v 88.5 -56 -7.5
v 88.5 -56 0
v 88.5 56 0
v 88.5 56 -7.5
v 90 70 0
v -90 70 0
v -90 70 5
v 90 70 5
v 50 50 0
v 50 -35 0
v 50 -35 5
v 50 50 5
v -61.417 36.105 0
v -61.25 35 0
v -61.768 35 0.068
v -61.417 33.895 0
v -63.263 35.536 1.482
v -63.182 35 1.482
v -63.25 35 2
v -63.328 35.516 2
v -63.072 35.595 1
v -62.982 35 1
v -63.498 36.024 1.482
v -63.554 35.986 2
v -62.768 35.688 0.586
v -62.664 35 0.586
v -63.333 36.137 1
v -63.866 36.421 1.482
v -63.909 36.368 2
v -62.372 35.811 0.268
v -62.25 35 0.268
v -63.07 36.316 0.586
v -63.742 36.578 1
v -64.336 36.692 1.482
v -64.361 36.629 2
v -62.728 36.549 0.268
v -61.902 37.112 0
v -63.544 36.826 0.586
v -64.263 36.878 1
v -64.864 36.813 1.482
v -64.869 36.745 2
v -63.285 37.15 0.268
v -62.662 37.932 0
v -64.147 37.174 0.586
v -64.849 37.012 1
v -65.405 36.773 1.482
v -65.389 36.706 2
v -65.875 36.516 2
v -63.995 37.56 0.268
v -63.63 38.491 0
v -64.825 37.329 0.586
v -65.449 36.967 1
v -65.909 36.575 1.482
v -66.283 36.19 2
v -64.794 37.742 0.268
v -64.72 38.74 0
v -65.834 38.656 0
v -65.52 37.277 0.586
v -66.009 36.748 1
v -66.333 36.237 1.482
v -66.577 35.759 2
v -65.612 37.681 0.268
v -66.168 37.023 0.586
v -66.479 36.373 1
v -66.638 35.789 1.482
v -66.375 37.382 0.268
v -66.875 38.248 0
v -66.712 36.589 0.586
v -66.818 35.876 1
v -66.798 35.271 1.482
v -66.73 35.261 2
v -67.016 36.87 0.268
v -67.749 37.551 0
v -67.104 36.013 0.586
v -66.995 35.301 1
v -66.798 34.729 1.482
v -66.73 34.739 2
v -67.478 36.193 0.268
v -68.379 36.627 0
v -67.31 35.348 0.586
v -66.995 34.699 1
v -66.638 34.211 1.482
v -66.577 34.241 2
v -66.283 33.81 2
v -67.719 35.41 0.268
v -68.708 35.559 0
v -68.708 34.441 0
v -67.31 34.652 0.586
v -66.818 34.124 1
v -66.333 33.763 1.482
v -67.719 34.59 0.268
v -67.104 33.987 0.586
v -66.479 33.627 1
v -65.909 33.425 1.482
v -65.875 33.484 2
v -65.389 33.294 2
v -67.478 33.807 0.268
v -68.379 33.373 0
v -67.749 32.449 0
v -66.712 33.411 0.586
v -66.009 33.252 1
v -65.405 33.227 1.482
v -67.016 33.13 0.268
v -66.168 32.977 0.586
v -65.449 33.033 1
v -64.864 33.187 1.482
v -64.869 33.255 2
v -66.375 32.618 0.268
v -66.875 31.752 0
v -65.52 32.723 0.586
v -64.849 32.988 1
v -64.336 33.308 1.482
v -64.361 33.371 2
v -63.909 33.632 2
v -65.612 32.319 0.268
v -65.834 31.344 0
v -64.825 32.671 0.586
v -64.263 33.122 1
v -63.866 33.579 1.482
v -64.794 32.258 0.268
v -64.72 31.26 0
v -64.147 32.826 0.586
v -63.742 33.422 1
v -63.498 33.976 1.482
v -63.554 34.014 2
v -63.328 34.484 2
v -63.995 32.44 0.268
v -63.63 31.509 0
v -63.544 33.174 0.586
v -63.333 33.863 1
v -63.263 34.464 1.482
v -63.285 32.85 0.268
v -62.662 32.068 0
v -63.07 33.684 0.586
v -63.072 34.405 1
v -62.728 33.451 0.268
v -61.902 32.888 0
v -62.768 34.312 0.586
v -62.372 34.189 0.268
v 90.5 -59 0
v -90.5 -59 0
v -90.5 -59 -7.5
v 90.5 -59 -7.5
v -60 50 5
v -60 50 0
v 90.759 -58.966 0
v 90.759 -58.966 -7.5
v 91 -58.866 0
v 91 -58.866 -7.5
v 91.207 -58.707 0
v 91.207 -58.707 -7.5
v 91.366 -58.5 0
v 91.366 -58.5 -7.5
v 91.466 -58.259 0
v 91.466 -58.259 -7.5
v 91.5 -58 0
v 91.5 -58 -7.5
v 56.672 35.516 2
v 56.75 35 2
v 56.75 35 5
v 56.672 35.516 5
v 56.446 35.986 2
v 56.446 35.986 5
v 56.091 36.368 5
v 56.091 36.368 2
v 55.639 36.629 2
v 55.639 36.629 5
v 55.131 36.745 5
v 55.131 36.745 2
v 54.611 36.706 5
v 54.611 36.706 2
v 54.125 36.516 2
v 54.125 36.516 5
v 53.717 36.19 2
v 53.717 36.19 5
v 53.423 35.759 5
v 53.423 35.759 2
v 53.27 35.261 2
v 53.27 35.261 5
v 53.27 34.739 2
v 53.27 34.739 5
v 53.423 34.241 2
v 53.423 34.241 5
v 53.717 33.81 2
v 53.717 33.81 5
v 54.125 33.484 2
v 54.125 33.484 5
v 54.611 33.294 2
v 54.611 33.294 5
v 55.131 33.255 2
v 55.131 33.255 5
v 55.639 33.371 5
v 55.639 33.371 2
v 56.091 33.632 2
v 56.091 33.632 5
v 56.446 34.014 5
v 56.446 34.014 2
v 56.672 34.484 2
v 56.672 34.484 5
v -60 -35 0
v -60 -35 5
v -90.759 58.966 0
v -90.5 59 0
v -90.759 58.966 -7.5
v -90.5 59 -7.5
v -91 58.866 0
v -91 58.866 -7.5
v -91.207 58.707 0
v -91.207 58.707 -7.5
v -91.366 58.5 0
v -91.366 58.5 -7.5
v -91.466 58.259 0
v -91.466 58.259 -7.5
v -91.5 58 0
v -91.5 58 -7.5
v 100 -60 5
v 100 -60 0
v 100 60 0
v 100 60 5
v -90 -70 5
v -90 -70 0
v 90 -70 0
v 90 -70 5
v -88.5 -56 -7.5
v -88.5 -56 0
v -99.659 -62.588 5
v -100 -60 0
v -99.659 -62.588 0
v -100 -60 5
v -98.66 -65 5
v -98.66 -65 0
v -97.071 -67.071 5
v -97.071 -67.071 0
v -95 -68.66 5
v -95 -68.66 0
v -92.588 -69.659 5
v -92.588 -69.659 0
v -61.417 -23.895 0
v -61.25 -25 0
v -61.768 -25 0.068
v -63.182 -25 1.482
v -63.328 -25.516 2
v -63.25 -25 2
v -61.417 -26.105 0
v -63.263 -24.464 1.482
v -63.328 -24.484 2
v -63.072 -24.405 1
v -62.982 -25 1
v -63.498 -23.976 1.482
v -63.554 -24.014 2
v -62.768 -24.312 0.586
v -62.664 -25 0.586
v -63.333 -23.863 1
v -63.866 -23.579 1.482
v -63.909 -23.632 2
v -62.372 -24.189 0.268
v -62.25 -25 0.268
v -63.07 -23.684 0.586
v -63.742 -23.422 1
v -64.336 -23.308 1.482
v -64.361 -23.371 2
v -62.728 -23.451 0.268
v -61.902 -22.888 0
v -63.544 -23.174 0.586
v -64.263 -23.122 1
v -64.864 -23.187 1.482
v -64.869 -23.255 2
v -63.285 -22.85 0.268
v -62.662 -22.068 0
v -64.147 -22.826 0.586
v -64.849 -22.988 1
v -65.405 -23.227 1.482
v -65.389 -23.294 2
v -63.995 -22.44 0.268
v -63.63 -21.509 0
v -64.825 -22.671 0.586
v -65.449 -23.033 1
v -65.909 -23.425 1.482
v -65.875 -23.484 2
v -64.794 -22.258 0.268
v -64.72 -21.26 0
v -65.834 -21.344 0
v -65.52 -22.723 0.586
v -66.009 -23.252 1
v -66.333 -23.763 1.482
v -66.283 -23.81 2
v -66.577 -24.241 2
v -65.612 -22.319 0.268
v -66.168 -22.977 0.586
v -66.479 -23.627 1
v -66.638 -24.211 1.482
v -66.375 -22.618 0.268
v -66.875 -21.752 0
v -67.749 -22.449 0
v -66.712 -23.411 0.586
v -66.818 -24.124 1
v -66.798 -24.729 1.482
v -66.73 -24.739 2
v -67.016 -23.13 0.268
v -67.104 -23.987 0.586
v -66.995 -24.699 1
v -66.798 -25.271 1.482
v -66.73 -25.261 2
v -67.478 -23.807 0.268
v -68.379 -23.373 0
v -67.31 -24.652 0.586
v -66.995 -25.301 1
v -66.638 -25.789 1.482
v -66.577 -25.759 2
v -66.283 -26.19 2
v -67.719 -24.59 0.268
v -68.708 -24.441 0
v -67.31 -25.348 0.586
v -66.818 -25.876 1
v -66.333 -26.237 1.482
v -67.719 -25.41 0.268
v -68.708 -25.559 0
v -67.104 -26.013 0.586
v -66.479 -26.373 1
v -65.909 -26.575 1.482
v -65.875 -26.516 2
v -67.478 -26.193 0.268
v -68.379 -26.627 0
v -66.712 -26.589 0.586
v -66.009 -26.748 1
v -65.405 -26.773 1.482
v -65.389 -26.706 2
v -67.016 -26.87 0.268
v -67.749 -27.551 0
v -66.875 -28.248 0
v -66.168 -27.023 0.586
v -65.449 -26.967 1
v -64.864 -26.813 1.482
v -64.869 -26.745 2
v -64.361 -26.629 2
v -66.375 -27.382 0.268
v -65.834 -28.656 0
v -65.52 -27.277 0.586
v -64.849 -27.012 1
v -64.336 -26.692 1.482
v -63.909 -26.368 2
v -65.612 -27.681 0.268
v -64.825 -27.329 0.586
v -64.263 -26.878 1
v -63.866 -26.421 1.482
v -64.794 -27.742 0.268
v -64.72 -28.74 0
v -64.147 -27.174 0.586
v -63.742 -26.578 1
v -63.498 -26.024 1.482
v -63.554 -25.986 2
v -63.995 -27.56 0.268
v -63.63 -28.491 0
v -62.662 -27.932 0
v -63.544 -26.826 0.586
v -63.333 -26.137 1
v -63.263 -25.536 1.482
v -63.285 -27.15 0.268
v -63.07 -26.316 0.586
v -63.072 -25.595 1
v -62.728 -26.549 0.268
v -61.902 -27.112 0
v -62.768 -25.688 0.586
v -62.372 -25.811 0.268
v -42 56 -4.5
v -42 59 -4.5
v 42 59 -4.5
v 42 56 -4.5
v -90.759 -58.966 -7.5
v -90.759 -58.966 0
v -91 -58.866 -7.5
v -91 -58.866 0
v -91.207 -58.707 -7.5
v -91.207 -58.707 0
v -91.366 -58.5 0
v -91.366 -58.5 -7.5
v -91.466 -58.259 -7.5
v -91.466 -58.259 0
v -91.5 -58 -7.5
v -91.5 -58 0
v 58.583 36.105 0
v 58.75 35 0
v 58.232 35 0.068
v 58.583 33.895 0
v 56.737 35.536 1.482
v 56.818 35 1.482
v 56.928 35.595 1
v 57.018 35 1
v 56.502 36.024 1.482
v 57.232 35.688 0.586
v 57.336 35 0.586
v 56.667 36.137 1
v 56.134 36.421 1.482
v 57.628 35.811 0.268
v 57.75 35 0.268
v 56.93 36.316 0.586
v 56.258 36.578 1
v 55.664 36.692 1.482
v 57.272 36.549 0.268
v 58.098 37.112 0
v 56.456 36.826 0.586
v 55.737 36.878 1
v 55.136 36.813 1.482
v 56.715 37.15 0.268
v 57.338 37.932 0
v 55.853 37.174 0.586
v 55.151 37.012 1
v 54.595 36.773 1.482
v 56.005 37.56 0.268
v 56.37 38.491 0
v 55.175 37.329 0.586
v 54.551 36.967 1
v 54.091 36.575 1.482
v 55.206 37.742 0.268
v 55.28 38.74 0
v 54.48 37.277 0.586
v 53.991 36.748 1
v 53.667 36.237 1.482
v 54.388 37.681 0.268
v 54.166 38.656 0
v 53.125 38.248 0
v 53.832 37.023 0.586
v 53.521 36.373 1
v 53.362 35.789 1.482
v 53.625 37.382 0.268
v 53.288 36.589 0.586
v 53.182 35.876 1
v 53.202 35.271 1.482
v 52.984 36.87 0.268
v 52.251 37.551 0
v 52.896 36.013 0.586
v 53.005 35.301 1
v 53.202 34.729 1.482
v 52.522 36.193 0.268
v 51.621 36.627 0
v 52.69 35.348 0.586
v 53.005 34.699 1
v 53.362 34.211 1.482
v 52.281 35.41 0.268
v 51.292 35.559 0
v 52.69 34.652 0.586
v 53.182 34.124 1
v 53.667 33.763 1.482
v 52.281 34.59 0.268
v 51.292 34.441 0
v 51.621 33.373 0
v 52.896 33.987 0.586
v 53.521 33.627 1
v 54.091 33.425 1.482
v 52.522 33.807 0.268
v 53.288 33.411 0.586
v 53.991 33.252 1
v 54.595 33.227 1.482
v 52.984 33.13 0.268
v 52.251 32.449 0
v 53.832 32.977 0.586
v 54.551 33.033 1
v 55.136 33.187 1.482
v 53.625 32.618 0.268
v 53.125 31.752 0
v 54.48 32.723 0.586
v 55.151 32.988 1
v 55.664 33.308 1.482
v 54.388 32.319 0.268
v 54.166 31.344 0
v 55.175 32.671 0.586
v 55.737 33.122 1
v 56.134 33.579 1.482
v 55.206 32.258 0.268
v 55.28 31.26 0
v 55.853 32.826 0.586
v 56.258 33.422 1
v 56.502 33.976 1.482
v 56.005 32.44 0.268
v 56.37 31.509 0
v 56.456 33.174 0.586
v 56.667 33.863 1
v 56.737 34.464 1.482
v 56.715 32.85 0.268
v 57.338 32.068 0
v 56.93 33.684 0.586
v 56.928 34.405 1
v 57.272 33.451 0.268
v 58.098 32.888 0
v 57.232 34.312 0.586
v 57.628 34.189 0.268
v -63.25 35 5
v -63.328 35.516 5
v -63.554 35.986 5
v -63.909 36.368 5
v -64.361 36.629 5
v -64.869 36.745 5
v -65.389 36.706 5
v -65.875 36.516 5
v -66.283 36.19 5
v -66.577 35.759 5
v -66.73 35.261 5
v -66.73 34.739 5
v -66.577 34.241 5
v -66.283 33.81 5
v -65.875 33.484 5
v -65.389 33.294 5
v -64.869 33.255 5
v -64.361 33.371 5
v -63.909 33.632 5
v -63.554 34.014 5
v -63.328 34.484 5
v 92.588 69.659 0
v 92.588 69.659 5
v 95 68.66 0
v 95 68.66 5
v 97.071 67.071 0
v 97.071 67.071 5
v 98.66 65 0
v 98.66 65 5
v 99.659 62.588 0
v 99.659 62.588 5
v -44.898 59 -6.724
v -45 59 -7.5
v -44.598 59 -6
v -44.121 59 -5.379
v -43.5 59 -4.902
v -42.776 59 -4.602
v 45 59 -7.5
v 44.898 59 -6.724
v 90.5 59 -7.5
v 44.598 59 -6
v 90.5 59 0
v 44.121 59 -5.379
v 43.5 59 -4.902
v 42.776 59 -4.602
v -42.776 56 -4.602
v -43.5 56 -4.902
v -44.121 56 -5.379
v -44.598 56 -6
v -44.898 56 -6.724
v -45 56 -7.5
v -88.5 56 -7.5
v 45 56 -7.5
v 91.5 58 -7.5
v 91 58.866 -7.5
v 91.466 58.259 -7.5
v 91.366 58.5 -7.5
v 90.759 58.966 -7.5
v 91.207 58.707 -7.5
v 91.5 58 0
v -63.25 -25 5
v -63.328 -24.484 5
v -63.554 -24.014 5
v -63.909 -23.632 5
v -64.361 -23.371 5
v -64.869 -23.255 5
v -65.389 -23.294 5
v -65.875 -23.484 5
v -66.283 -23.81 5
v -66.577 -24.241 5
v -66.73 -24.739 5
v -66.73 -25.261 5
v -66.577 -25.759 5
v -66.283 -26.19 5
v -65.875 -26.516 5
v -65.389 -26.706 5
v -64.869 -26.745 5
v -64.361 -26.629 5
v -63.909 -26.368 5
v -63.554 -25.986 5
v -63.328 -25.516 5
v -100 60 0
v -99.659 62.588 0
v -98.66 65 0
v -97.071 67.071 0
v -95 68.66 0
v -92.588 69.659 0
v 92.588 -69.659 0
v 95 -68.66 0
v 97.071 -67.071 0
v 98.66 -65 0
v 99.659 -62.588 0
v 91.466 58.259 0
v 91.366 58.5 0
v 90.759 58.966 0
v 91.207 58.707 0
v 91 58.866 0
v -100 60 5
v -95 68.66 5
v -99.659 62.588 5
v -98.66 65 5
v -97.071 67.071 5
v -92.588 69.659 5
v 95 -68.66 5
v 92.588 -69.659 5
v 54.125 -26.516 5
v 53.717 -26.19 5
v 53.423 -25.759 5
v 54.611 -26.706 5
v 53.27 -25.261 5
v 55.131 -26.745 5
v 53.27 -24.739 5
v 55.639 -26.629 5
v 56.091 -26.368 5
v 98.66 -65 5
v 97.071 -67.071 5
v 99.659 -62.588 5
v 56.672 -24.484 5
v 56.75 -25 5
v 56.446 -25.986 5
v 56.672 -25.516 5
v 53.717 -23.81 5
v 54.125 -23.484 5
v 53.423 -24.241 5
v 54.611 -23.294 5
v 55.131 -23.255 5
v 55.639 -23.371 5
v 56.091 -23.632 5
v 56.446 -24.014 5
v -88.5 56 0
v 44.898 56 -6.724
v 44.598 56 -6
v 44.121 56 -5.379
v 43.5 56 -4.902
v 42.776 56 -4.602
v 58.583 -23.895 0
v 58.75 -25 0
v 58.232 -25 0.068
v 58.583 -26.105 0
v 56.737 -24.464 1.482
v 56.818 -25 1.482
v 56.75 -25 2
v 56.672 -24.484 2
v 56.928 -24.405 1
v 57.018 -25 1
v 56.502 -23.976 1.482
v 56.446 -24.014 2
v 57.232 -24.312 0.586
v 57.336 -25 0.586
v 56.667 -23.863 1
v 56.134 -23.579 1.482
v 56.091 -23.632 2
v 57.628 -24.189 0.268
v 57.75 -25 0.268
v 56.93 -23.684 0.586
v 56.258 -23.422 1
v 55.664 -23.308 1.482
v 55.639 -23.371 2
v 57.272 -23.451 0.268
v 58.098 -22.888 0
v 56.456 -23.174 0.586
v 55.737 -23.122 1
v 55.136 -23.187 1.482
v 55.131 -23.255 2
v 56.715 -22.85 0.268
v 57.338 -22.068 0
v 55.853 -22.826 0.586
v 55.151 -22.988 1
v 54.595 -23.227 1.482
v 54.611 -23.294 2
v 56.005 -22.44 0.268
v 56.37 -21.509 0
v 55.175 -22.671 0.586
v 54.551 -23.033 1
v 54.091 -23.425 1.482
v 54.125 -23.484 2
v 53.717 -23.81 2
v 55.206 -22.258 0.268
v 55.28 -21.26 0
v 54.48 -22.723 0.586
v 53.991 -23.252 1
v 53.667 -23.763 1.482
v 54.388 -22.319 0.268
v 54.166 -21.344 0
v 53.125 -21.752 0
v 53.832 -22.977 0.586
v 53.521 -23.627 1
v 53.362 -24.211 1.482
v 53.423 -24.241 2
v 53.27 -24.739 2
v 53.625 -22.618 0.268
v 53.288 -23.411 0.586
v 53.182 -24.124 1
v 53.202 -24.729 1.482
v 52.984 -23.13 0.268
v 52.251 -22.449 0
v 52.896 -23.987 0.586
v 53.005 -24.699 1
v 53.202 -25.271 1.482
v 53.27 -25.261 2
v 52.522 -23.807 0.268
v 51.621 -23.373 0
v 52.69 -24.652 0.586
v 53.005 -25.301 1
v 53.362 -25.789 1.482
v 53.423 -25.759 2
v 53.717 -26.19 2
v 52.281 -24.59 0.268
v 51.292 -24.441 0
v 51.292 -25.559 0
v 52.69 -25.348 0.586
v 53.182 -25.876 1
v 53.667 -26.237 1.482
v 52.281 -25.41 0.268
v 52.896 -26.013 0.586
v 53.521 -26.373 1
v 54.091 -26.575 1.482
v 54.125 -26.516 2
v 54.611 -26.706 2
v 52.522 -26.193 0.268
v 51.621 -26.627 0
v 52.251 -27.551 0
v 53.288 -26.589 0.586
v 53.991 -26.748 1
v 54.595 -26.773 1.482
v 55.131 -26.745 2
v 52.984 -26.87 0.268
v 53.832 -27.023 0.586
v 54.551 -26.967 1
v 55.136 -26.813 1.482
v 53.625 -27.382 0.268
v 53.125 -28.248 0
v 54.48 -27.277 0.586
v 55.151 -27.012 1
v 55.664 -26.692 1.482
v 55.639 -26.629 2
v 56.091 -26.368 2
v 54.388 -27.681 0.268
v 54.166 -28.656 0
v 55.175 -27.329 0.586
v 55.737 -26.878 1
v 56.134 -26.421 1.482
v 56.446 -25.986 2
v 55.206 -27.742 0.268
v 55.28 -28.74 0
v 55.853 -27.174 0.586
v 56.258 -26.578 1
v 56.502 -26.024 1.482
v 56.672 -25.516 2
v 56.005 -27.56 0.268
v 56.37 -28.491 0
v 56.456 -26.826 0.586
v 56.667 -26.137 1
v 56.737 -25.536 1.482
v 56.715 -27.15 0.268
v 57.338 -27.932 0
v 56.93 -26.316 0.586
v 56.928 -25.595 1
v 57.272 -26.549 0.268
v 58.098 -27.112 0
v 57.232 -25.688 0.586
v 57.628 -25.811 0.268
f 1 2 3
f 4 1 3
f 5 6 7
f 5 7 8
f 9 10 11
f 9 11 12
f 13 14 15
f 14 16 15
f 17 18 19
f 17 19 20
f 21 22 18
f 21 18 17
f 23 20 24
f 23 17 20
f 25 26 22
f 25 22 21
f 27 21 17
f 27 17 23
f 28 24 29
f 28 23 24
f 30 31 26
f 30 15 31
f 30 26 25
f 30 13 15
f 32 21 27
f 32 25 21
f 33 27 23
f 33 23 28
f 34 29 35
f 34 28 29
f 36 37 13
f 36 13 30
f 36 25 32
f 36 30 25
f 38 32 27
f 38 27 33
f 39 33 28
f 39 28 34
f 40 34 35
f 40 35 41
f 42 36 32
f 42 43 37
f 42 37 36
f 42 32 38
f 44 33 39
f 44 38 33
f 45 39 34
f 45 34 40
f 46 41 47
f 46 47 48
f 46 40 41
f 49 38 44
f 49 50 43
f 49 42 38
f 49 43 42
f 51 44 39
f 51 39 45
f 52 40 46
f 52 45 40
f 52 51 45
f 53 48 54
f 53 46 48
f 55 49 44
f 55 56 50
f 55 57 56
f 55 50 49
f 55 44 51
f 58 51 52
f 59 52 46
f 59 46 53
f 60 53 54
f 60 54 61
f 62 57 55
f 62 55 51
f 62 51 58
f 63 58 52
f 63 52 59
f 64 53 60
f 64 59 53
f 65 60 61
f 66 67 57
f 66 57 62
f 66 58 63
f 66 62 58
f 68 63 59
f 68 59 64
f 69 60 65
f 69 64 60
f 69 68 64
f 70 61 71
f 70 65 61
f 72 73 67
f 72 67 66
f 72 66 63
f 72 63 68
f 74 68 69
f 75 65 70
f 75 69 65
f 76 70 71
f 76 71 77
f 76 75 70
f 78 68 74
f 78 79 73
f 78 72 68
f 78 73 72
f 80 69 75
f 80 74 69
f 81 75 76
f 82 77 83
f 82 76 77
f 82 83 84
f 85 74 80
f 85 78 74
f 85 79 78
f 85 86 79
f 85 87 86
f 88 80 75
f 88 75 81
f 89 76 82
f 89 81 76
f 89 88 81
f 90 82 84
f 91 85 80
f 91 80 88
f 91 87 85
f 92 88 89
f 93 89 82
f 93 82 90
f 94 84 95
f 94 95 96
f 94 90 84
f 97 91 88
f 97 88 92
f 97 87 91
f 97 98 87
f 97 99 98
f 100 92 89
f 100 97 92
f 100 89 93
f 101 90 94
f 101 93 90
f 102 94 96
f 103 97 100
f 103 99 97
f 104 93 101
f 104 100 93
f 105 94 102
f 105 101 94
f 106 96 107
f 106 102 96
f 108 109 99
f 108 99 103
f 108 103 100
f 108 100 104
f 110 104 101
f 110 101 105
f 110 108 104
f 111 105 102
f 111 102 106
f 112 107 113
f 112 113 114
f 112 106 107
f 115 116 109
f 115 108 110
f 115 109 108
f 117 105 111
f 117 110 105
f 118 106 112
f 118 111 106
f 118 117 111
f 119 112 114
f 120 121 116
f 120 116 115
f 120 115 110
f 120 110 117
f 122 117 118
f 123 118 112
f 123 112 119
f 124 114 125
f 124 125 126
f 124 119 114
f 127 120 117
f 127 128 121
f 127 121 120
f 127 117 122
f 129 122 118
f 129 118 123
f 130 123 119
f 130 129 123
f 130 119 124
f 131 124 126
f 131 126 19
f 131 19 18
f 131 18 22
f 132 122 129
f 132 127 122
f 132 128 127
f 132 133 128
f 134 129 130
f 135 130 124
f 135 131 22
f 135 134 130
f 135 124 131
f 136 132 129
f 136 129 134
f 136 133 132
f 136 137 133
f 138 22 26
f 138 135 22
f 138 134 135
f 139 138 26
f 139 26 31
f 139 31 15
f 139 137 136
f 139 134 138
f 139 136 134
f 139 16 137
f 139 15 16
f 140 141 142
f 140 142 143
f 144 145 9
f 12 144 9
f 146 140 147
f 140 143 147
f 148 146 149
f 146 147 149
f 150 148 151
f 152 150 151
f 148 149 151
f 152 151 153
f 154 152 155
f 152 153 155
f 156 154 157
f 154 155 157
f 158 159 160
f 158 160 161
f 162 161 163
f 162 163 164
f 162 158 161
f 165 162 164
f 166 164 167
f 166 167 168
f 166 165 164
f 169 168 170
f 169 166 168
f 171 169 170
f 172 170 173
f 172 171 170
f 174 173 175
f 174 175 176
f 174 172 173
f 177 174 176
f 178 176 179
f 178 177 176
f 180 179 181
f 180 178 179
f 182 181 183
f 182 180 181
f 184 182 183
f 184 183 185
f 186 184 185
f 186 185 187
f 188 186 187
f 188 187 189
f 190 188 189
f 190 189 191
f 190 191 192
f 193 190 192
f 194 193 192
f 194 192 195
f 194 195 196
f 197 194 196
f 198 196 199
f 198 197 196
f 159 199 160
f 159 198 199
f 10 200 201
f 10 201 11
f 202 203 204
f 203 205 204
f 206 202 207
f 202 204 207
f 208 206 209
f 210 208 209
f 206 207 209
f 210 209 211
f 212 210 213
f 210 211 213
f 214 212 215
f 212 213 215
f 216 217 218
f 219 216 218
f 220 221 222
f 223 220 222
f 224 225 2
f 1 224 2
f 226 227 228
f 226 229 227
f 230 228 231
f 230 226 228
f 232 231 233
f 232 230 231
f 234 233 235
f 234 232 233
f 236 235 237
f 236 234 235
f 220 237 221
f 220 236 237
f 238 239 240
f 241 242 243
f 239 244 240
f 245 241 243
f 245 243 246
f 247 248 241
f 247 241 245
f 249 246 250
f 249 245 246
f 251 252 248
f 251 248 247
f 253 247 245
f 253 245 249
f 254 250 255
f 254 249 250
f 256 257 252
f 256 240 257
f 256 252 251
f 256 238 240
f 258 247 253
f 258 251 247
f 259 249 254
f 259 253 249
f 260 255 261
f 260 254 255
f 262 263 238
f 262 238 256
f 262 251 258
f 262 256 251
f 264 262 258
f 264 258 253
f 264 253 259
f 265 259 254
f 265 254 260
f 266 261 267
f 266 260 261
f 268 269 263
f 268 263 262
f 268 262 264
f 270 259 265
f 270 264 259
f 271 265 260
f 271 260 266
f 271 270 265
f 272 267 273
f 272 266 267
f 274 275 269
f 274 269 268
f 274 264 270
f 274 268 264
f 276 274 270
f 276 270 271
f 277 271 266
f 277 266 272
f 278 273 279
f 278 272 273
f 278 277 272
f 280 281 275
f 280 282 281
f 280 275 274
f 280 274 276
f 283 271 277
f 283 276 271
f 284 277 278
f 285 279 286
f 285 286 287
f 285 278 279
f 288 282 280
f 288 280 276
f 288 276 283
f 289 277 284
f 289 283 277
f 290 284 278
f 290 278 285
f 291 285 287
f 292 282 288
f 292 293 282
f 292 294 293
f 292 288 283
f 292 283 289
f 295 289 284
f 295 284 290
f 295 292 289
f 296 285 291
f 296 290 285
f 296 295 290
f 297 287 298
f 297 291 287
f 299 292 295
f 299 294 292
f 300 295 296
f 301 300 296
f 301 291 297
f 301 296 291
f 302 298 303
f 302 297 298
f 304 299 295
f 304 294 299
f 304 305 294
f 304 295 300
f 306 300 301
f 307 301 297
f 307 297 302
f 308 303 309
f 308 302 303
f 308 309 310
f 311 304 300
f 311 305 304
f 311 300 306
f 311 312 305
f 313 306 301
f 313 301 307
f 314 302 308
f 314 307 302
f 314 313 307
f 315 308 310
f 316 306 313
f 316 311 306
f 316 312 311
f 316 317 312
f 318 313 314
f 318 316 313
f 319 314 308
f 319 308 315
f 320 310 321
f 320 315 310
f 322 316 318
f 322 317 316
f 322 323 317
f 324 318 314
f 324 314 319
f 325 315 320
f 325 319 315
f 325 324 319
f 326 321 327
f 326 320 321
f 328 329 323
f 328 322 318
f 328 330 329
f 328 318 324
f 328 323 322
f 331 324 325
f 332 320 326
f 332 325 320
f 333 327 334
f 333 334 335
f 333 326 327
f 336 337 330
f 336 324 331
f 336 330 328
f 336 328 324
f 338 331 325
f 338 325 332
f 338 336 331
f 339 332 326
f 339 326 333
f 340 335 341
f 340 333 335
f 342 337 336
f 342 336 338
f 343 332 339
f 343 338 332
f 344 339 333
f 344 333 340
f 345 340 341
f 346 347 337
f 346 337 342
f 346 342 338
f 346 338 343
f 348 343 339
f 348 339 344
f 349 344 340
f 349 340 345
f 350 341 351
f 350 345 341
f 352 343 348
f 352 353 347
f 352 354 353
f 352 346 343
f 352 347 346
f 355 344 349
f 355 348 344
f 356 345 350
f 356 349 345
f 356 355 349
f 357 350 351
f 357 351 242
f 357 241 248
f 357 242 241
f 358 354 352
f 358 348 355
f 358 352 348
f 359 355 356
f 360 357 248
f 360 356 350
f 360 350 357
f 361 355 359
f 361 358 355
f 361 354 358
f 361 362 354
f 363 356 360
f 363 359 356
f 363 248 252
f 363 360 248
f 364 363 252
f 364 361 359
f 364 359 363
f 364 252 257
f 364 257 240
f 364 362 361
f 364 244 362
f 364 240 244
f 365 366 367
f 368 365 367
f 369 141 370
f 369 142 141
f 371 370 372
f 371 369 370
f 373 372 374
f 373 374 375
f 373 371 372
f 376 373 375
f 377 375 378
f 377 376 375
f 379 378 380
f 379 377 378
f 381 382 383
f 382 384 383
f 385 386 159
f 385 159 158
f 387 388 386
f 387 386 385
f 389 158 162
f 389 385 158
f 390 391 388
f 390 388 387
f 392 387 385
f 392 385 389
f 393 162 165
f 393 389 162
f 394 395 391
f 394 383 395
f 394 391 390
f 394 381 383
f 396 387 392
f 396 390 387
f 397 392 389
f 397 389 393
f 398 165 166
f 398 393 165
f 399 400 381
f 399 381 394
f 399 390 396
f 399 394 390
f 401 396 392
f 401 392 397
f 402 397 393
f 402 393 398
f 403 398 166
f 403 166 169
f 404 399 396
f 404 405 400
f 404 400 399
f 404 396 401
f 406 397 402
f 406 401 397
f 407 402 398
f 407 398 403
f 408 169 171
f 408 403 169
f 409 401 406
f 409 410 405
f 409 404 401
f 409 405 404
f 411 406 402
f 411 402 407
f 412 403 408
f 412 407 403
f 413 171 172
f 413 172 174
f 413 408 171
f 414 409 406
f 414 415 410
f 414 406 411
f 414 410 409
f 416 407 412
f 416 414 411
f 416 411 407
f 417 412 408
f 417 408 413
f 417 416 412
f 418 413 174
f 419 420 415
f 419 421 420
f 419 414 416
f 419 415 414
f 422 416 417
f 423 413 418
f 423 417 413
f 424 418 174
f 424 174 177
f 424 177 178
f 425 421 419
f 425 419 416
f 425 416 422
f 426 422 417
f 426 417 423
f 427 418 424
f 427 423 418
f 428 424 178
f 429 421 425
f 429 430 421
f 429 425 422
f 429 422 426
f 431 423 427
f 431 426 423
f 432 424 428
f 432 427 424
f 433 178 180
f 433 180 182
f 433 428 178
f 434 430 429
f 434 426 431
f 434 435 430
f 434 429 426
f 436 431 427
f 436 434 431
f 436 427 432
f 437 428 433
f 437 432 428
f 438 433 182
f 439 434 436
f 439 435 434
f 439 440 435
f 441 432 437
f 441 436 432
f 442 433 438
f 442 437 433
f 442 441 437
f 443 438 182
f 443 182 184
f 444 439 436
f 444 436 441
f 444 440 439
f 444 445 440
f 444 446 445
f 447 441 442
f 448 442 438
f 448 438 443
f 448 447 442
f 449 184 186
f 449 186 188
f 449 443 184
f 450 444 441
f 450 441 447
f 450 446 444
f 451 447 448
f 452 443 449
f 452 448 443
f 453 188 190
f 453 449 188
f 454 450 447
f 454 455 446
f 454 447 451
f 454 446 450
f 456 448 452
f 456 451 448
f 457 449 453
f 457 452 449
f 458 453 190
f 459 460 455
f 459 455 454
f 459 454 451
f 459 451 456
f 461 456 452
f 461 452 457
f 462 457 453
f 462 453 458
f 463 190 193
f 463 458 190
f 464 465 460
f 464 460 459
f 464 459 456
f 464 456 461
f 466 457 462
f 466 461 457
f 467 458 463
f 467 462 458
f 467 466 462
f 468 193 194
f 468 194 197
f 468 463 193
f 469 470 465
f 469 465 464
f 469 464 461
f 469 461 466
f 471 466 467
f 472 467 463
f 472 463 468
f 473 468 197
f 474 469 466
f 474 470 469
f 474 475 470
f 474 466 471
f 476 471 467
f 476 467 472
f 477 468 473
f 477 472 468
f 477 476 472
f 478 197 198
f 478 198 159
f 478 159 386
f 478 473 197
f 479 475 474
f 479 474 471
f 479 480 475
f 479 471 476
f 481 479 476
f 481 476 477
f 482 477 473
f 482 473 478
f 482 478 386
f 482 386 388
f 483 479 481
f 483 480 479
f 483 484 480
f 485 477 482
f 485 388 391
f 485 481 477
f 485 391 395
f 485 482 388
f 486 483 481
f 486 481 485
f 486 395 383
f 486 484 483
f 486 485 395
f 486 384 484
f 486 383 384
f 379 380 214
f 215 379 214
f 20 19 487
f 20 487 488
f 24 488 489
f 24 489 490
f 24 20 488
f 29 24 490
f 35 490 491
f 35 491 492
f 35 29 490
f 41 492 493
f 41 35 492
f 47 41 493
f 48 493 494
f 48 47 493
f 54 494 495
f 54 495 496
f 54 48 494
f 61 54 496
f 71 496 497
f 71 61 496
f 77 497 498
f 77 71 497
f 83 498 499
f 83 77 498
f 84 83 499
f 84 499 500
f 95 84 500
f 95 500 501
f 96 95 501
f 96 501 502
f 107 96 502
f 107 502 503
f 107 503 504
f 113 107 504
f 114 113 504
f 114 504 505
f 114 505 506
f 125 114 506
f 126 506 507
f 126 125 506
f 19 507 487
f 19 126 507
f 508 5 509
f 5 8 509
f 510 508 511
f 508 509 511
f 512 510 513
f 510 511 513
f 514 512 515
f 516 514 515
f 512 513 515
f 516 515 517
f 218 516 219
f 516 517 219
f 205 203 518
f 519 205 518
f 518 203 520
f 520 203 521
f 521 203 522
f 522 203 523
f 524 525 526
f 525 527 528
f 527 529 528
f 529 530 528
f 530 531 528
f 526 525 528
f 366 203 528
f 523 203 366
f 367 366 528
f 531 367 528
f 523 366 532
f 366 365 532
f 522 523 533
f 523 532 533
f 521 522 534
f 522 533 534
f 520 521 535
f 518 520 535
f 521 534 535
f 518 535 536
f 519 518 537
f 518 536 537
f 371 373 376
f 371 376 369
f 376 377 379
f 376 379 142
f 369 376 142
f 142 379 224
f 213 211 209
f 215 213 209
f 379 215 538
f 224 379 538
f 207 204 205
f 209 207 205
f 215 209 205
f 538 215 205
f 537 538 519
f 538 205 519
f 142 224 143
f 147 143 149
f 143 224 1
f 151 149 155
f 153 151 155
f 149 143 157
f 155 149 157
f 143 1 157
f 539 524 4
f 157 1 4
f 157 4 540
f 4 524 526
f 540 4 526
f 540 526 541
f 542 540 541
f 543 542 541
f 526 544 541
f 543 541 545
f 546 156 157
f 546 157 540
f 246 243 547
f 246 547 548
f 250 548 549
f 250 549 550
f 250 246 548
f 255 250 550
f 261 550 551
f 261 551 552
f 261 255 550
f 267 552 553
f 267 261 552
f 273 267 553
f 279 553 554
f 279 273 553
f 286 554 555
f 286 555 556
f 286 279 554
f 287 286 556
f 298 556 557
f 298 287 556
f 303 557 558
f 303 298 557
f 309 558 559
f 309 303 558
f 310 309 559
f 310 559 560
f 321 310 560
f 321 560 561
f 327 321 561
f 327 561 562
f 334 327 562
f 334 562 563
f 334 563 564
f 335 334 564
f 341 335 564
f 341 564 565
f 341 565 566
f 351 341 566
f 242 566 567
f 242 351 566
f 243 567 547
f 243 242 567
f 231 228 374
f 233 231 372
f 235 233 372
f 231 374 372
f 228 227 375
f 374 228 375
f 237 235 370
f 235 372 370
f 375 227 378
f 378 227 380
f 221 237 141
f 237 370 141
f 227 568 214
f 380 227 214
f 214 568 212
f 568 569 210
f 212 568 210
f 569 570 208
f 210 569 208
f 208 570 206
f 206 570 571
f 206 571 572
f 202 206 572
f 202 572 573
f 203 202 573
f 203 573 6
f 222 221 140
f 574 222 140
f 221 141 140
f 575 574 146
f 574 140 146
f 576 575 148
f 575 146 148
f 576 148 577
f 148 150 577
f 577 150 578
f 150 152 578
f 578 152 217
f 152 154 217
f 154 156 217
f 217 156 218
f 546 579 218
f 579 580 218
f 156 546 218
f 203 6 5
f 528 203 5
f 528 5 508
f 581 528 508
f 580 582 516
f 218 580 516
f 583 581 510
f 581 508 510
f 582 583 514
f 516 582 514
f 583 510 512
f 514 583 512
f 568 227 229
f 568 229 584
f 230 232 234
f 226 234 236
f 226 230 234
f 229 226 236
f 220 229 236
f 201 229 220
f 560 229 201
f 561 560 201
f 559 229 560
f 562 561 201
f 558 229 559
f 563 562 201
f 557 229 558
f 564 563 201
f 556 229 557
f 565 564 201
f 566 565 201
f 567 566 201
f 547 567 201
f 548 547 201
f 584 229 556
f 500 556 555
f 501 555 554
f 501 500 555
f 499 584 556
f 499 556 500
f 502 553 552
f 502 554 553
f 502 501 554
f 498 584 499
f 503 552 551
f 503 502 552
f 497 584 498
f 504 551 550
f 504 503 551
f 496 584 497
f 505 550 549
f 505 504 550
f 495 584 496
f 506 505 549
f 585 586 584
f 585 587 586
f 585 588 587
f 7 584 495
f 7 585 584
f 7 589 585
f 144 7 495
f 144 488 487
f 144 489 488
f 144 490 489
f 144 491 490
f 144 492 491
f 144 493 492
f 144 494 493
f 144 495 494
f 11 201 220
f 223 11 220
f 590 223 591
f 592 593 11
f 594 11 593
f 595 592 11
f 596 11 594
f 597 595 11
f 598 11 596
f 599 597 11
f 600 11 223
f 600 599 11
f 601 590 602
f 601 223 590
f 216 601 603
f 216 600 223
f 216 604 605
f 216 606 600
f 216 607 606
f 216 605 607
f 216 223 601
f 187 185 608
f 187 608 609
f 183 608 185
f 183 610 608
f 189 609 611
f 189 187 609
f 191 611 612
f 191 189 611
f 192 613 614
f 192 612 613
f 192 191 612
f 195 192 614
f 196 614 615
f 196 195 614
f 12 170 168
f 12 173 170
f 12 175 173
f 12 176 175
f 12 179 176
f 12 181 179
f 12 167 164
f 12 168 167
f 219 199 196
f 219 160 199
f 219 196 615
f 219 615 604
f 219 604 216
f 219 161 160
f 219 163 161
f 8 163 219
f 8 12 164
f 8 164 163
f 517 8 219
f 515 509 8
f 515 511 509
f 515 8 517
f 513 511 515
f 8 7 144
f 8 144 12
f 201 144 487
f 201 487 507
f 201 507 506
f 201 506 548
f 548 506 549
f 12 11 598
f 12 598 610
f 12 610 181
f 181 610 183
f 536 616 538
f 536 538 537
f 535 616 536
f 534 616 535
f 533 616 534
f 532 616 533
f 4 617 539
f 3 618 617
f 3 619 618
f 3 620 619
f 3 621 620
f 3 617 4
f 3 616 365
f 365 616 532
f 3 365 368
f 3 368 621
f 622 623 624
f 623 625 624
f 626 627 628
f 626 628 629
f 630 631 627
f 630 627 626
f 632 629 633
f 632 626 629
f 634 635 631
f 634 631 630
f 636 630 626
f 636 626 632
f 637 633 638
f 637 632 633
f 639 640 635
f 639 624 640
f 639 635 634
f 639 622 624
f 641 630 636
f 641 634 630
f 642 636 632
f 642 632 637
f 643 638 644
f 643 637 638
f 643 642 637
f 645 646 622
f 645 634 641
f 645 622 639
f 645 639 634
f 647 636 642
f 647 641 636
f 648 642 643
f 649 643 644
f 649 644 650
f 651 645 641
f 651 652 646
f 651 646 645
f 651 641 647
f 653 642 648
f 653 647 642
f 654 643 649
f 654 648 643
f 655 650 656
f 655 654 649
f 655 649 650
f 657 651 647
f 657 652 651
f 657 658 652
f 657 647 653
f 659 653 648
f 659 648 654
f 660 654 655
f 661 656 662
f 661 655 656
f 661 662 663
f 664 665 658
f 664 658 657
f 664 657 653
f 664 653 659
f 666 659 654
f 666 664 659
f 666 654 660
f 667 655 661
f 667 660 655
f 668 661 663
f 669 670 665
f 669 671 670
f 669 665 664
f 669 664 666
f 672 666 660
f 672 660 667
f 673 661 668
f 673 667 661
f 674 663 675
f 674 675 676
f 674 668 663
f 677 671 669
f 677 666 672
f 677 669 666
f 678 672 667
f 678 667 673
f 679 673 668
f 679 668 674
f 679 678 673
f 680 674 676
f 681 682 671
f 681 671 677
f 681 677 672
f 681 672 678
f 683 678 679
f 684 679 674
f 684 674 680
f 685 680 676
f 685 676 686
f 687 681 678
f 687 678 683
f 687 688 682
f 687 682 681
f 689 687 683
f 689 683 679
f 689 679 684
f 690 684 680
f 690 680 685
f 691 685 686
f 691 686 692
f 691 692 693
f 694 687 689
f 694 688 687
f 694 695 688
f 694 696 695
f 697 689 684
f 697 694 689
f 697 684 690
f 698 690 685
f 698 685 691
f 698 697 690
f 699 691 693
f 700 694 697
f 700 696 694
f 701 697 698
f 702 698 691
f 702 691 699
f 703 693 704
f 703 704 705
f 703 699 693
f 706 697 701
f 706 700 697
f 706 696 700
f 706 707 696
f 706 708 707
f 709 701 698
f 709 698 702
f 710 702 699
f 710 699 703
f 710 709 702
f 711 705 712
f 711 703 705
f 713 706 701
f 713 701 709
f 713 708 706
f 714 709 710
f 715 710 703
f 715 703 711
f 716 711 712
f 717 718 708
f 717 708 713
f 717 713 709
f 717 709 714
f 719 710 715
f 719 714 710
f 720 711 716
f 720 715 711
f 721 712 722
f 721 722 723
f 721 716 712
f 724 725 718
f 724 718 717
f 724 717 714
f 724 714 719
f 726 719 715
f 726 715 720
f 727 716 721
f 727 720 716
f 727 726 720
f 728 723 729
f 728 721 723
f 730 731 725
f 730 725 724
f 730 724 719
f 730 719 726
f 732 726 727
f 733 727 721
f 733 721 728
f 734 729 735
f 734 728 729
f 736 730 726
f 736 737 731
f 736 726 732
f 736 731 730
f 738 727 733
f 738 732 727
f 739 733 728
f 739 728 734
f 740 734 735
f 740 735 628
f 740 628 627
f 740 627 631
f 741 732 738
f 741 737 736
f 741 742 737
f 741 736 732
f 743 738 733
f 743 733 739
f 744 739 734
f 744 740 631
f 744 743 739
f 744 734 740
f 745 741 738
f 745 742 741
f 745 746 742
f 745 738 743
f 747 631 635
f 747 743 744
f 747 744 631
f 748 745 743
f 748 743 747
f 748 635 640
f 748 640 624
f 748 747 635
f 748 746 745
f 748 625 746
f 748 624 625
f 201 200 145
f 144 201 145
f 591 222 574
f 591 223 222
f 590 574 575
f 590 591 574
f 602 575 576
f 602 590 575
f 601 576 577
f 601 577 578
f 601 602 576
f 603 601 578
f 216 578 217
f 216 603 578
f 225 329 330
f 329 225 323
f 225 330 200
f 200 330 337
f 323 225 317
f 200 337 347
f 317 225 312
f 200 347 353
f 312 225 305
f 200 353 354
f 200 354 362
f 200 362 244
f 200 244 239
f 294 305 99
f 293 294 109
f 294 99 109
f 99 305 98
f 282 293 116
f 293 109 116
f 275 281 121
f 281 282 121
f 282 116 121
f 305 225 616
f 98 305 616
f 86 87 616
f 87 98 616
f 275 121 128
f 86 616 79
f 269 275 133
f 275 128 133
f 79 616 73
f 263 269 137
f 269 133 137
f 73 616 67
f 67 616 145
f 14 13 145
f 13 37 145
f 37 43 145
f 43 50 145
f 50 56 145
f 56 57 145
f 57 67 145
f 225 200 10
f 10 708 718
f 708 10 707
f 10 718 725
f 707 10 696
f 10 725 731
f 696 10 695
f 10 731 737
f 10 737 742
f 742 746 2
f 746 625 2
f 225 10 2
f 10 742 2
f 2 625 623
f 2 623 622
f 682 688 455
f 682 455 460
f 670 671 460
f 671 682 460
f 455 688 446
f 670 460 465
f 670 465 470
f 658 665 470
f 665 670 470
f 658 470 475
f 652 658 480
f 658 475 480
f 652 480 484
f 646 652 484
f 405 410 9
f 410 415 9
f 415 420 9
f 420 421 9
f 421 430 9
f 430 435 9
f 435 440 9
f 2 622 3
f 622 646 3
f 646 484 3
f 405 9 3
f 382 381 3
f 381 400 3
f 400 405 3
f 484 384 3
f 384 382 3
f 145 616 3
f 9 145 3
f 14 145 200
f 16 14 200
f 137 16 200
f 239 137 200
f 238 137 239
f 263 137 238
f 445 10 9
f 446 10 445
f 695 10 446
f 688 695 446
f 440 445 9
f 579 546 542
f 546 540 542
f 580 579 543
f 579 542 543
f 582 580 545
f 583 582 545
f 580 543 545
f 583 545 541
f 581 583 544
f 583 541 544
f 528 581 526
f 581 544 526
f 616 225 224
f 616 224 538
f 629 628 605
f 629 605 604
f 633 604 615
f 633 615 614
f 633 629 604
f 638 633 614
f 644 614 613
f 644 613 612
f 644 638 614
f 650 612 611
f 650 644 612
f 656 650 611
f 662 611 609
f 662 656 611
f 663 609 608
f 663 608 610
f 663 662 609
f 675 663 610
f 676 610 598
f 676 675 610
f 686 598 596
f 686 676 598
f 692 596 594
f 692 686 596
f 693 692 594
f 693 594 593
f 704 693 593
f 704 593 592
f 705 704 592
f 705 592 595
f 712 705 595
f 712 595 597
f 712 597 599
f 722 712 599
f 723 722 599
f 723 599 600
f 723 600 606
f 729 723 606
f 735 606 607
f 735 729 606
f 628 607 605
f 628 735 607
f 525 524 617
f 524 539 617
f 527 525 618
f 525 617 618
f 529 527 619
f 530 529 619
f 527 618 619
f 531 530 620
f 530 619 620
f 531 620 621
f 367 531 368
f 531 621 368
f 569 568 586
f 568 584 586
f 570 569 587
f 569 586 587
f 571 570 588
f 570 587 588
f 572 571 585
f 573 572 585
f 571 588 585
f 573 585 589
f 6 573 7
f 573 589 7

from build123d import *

# Parameters (mm, degrees)
F0_W     = 200
F0_H     = 140
F0_W_2   = 183
F0_H_2   = 118
F0_W_3   = 177
F0_H_3   = 112
F0_R     = 1.75
F0_W_4   = 110
F0_H_4   = 85
F1_DEPTH = 5
F2_DEPTH = 7.5
F3_R     = 10
F4_R     = 1
F5_R     = 2
F6_W     = 45
F6_H     = 3
F7_DEPTH = 25
F8_R     = 2.99999


# Not quite as in the source:
# - a fillet or chamfer is up to 0.001 mm smaller than in the source, because OpenCascade refuses the exact size


with BuildPart() as f1:
    # F0 (on Top) → F1 (new body)
    with BuildSketch(Plane.XY):
        Rectangle(F0_W, F0_H)
        Rectangle(F0_W_2, F0_H_2, mode=Mode.SUBTRACT)
        Rectangle(F0_W_2, F0_H_2)
        Rectangle(F0_W_3, F0_H_3, mode=Mode.SUBTRACT)
        Rectangle(F0_W_3, F0_H_3)
        with Locations((-65, -25)):
            Circle(F0_R, mode=Mode.SUBTRACT)
        with Locations((55, -25)):
            Circle(F0_R, mode=Mode.SUBTRACT)
        with Locations((-5, 7.5)):
            Rectangle(F0_W_4, F0_H_4, mode=Mode.SUBTRACT)
        with Locations((-65, 35)):
            Circle(F0_R, mode=Mode.SUBTRACT)
        with Locations((55, 35)):
            Circle(F0_R, mode=Mode.SUBTRACT)
    extrude(amount=F1_DEPTH)

    # F0 (on Top) → F2 (join)
    with BuildSketch(Plane.XY):
        Rectangle(F0_W_2, F0_H_2)
        Rectangle(F0_W_3, F0_H_3, mode=Mode.SUBTRACT)
    extrude(amount=-F2_DEPTH)

    # F3
    f3_edges = [f1.edges().sort_by_distance(p)[0] for p in [
        (-100, 70, 2.5),
        (-100, -70, 2.5),
        (100, -70, 2.5),
        (100, 70, 2.5),
    ]]
    fillet(f3_edges, radius=F3_R)

    # F4
    f4_edges = [f1.edges().sort_by_distance(p)[0] for p in [
        (-91.5, -59, -3.75),
        (91.5, -59, -3.75),
        (-91.5, 59, -3.75),
        (91.5, 59, -3.75),
    ]]
    fillet(f4_edges, radius=F4_R)

    # F5
    f5_edges = [f1.edges().sort_by_distance(p)[0] for p in [
        (-66.75, -25, 0),
        (53.25, -25, 0),
        (-66.75, 35, 0),
        (53.25, 35, 0),
    ]]
    fillet(f5_edges, radius=F5_R)

    # F6 (on face) → F7 (cut)
    with BuildSketch(Plane(origin=(0, 59, 0), x_dir=(-1, 0, 0), z_dir=(0, 1, 0))):
        with Locations((-22.5, -6)):
            Rectangle(F6_W, F6_H)
        with Locations((22.5, -6)):
            Rectangle(F6_W, F6_H)
    extrude(amount=-F7_DEPTH, mode=Mode.SUBTRACT)

    # F8 (radius 3 in the source; OpenCascade refuses exactly that, so slightly less here)
    f8_edges = [f1.edges().sort_by_distance(p)[0] for p in [
        (-45, 57.5, -4.5),
        (45, 57.5, -4.5),
    ]]
    fillet(f8_edges, radius=F8_R)


solid = f1.part
